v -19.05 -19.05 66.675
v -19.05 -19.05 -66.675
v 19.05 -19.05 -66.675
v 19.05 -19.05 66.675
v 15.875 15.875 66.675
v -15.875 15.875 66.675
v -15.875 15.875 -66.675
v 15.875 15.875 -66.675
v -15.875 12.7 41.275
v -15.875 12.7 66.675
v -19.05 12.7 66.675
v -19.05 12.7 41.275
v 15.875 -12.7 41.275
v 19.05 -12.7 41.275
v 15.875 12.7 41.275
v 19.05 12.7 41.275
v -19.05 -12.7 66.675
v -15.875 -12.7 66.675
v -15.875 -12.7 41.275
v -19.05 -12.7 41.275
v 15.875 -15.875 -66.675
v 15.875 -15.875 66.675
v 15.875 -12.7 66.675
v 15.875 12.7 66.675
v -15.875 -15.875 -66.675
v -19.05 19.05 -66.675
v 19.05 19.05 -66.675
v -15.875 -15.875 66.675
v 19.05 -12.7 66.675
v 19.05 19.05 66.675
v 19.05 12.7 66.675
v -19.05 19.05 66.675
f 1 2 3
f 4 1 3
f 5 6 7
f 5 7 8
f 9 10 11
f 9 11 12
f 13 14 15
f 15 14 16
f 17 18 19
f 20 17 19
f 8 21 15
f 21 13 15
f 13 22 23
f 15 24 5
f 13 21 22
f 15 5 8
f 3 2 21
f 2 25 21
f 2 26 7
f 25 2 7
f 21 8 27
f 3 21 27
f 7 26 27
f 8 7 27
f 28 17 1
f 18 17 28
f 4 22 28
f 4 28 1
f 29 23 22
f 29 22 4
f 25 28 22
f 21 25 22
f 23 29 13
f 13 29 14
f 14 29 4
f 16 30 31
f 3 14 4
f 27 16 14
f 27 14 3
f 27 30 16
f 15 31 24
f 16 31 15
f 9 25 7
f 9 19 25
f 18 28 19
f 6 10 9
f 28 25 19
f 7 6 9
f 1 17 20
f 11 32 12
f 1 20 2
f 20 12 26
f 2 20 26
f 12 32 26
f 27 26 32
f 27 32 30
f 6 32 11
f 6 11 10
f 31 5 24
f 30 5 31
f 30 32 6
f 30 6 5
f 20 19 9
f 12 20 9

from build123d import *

# Parameters (mm, degrees)
SKETCH1_W           = 38.1
SKETCH1_H           = 133.35
BOSS_EXTRUDE1_DEPTH = 19.05
SKETCH2_W           = 31.75
SKETCH2_H           = 31.75
CUT_EXTRUDE1_DEPTH  = 134.35
SKETCH3_W           = 25.4
SKETCH3_H           = 25.4
CUT_EXTRUDE2_DEPTH  = 39.1


with BuildPart() as part:
    # Sketch1 → Boss-Extrude1 (new body, symmetric)
    with BuildSketch(Plane(origin=(0, 0, 0), x_dir=(1, 0, 0), z_dir=(0, 1, 0))):
        Rectangle(SKETCH1_W, SKETCH1_H)
    extrude(amount=BOSS_EXTRUDE1_DEPTH, both=True)

    # Sketch2 → Cut-Extrude1 (cut, through all)
    with BuildSketch(Plane.XY.offset(66.675)):
        Rectangle(SKETCH2_W, SKETCH2_H)
    extrude(amount=-CUT_EXTRUDE1_DEPTH, mode=Mode.SUBTRACT)

    # Sketch3 → Cut-Extrude2 (cut, through all)
    with BuildSketch(Plane(origin=(19.05, 0, 0), x_dir=(0, 0, -1), z_dir=(1, 0, 0))):
        with Locations((-53.975, 0)):
            Rectangle(SKETCH3_W, SKETCH3_H)
    extrude(amount=-CUT_EXTRUDE2_DEPTH, mode=Mode.SUBTRACT)


solid = part.part
